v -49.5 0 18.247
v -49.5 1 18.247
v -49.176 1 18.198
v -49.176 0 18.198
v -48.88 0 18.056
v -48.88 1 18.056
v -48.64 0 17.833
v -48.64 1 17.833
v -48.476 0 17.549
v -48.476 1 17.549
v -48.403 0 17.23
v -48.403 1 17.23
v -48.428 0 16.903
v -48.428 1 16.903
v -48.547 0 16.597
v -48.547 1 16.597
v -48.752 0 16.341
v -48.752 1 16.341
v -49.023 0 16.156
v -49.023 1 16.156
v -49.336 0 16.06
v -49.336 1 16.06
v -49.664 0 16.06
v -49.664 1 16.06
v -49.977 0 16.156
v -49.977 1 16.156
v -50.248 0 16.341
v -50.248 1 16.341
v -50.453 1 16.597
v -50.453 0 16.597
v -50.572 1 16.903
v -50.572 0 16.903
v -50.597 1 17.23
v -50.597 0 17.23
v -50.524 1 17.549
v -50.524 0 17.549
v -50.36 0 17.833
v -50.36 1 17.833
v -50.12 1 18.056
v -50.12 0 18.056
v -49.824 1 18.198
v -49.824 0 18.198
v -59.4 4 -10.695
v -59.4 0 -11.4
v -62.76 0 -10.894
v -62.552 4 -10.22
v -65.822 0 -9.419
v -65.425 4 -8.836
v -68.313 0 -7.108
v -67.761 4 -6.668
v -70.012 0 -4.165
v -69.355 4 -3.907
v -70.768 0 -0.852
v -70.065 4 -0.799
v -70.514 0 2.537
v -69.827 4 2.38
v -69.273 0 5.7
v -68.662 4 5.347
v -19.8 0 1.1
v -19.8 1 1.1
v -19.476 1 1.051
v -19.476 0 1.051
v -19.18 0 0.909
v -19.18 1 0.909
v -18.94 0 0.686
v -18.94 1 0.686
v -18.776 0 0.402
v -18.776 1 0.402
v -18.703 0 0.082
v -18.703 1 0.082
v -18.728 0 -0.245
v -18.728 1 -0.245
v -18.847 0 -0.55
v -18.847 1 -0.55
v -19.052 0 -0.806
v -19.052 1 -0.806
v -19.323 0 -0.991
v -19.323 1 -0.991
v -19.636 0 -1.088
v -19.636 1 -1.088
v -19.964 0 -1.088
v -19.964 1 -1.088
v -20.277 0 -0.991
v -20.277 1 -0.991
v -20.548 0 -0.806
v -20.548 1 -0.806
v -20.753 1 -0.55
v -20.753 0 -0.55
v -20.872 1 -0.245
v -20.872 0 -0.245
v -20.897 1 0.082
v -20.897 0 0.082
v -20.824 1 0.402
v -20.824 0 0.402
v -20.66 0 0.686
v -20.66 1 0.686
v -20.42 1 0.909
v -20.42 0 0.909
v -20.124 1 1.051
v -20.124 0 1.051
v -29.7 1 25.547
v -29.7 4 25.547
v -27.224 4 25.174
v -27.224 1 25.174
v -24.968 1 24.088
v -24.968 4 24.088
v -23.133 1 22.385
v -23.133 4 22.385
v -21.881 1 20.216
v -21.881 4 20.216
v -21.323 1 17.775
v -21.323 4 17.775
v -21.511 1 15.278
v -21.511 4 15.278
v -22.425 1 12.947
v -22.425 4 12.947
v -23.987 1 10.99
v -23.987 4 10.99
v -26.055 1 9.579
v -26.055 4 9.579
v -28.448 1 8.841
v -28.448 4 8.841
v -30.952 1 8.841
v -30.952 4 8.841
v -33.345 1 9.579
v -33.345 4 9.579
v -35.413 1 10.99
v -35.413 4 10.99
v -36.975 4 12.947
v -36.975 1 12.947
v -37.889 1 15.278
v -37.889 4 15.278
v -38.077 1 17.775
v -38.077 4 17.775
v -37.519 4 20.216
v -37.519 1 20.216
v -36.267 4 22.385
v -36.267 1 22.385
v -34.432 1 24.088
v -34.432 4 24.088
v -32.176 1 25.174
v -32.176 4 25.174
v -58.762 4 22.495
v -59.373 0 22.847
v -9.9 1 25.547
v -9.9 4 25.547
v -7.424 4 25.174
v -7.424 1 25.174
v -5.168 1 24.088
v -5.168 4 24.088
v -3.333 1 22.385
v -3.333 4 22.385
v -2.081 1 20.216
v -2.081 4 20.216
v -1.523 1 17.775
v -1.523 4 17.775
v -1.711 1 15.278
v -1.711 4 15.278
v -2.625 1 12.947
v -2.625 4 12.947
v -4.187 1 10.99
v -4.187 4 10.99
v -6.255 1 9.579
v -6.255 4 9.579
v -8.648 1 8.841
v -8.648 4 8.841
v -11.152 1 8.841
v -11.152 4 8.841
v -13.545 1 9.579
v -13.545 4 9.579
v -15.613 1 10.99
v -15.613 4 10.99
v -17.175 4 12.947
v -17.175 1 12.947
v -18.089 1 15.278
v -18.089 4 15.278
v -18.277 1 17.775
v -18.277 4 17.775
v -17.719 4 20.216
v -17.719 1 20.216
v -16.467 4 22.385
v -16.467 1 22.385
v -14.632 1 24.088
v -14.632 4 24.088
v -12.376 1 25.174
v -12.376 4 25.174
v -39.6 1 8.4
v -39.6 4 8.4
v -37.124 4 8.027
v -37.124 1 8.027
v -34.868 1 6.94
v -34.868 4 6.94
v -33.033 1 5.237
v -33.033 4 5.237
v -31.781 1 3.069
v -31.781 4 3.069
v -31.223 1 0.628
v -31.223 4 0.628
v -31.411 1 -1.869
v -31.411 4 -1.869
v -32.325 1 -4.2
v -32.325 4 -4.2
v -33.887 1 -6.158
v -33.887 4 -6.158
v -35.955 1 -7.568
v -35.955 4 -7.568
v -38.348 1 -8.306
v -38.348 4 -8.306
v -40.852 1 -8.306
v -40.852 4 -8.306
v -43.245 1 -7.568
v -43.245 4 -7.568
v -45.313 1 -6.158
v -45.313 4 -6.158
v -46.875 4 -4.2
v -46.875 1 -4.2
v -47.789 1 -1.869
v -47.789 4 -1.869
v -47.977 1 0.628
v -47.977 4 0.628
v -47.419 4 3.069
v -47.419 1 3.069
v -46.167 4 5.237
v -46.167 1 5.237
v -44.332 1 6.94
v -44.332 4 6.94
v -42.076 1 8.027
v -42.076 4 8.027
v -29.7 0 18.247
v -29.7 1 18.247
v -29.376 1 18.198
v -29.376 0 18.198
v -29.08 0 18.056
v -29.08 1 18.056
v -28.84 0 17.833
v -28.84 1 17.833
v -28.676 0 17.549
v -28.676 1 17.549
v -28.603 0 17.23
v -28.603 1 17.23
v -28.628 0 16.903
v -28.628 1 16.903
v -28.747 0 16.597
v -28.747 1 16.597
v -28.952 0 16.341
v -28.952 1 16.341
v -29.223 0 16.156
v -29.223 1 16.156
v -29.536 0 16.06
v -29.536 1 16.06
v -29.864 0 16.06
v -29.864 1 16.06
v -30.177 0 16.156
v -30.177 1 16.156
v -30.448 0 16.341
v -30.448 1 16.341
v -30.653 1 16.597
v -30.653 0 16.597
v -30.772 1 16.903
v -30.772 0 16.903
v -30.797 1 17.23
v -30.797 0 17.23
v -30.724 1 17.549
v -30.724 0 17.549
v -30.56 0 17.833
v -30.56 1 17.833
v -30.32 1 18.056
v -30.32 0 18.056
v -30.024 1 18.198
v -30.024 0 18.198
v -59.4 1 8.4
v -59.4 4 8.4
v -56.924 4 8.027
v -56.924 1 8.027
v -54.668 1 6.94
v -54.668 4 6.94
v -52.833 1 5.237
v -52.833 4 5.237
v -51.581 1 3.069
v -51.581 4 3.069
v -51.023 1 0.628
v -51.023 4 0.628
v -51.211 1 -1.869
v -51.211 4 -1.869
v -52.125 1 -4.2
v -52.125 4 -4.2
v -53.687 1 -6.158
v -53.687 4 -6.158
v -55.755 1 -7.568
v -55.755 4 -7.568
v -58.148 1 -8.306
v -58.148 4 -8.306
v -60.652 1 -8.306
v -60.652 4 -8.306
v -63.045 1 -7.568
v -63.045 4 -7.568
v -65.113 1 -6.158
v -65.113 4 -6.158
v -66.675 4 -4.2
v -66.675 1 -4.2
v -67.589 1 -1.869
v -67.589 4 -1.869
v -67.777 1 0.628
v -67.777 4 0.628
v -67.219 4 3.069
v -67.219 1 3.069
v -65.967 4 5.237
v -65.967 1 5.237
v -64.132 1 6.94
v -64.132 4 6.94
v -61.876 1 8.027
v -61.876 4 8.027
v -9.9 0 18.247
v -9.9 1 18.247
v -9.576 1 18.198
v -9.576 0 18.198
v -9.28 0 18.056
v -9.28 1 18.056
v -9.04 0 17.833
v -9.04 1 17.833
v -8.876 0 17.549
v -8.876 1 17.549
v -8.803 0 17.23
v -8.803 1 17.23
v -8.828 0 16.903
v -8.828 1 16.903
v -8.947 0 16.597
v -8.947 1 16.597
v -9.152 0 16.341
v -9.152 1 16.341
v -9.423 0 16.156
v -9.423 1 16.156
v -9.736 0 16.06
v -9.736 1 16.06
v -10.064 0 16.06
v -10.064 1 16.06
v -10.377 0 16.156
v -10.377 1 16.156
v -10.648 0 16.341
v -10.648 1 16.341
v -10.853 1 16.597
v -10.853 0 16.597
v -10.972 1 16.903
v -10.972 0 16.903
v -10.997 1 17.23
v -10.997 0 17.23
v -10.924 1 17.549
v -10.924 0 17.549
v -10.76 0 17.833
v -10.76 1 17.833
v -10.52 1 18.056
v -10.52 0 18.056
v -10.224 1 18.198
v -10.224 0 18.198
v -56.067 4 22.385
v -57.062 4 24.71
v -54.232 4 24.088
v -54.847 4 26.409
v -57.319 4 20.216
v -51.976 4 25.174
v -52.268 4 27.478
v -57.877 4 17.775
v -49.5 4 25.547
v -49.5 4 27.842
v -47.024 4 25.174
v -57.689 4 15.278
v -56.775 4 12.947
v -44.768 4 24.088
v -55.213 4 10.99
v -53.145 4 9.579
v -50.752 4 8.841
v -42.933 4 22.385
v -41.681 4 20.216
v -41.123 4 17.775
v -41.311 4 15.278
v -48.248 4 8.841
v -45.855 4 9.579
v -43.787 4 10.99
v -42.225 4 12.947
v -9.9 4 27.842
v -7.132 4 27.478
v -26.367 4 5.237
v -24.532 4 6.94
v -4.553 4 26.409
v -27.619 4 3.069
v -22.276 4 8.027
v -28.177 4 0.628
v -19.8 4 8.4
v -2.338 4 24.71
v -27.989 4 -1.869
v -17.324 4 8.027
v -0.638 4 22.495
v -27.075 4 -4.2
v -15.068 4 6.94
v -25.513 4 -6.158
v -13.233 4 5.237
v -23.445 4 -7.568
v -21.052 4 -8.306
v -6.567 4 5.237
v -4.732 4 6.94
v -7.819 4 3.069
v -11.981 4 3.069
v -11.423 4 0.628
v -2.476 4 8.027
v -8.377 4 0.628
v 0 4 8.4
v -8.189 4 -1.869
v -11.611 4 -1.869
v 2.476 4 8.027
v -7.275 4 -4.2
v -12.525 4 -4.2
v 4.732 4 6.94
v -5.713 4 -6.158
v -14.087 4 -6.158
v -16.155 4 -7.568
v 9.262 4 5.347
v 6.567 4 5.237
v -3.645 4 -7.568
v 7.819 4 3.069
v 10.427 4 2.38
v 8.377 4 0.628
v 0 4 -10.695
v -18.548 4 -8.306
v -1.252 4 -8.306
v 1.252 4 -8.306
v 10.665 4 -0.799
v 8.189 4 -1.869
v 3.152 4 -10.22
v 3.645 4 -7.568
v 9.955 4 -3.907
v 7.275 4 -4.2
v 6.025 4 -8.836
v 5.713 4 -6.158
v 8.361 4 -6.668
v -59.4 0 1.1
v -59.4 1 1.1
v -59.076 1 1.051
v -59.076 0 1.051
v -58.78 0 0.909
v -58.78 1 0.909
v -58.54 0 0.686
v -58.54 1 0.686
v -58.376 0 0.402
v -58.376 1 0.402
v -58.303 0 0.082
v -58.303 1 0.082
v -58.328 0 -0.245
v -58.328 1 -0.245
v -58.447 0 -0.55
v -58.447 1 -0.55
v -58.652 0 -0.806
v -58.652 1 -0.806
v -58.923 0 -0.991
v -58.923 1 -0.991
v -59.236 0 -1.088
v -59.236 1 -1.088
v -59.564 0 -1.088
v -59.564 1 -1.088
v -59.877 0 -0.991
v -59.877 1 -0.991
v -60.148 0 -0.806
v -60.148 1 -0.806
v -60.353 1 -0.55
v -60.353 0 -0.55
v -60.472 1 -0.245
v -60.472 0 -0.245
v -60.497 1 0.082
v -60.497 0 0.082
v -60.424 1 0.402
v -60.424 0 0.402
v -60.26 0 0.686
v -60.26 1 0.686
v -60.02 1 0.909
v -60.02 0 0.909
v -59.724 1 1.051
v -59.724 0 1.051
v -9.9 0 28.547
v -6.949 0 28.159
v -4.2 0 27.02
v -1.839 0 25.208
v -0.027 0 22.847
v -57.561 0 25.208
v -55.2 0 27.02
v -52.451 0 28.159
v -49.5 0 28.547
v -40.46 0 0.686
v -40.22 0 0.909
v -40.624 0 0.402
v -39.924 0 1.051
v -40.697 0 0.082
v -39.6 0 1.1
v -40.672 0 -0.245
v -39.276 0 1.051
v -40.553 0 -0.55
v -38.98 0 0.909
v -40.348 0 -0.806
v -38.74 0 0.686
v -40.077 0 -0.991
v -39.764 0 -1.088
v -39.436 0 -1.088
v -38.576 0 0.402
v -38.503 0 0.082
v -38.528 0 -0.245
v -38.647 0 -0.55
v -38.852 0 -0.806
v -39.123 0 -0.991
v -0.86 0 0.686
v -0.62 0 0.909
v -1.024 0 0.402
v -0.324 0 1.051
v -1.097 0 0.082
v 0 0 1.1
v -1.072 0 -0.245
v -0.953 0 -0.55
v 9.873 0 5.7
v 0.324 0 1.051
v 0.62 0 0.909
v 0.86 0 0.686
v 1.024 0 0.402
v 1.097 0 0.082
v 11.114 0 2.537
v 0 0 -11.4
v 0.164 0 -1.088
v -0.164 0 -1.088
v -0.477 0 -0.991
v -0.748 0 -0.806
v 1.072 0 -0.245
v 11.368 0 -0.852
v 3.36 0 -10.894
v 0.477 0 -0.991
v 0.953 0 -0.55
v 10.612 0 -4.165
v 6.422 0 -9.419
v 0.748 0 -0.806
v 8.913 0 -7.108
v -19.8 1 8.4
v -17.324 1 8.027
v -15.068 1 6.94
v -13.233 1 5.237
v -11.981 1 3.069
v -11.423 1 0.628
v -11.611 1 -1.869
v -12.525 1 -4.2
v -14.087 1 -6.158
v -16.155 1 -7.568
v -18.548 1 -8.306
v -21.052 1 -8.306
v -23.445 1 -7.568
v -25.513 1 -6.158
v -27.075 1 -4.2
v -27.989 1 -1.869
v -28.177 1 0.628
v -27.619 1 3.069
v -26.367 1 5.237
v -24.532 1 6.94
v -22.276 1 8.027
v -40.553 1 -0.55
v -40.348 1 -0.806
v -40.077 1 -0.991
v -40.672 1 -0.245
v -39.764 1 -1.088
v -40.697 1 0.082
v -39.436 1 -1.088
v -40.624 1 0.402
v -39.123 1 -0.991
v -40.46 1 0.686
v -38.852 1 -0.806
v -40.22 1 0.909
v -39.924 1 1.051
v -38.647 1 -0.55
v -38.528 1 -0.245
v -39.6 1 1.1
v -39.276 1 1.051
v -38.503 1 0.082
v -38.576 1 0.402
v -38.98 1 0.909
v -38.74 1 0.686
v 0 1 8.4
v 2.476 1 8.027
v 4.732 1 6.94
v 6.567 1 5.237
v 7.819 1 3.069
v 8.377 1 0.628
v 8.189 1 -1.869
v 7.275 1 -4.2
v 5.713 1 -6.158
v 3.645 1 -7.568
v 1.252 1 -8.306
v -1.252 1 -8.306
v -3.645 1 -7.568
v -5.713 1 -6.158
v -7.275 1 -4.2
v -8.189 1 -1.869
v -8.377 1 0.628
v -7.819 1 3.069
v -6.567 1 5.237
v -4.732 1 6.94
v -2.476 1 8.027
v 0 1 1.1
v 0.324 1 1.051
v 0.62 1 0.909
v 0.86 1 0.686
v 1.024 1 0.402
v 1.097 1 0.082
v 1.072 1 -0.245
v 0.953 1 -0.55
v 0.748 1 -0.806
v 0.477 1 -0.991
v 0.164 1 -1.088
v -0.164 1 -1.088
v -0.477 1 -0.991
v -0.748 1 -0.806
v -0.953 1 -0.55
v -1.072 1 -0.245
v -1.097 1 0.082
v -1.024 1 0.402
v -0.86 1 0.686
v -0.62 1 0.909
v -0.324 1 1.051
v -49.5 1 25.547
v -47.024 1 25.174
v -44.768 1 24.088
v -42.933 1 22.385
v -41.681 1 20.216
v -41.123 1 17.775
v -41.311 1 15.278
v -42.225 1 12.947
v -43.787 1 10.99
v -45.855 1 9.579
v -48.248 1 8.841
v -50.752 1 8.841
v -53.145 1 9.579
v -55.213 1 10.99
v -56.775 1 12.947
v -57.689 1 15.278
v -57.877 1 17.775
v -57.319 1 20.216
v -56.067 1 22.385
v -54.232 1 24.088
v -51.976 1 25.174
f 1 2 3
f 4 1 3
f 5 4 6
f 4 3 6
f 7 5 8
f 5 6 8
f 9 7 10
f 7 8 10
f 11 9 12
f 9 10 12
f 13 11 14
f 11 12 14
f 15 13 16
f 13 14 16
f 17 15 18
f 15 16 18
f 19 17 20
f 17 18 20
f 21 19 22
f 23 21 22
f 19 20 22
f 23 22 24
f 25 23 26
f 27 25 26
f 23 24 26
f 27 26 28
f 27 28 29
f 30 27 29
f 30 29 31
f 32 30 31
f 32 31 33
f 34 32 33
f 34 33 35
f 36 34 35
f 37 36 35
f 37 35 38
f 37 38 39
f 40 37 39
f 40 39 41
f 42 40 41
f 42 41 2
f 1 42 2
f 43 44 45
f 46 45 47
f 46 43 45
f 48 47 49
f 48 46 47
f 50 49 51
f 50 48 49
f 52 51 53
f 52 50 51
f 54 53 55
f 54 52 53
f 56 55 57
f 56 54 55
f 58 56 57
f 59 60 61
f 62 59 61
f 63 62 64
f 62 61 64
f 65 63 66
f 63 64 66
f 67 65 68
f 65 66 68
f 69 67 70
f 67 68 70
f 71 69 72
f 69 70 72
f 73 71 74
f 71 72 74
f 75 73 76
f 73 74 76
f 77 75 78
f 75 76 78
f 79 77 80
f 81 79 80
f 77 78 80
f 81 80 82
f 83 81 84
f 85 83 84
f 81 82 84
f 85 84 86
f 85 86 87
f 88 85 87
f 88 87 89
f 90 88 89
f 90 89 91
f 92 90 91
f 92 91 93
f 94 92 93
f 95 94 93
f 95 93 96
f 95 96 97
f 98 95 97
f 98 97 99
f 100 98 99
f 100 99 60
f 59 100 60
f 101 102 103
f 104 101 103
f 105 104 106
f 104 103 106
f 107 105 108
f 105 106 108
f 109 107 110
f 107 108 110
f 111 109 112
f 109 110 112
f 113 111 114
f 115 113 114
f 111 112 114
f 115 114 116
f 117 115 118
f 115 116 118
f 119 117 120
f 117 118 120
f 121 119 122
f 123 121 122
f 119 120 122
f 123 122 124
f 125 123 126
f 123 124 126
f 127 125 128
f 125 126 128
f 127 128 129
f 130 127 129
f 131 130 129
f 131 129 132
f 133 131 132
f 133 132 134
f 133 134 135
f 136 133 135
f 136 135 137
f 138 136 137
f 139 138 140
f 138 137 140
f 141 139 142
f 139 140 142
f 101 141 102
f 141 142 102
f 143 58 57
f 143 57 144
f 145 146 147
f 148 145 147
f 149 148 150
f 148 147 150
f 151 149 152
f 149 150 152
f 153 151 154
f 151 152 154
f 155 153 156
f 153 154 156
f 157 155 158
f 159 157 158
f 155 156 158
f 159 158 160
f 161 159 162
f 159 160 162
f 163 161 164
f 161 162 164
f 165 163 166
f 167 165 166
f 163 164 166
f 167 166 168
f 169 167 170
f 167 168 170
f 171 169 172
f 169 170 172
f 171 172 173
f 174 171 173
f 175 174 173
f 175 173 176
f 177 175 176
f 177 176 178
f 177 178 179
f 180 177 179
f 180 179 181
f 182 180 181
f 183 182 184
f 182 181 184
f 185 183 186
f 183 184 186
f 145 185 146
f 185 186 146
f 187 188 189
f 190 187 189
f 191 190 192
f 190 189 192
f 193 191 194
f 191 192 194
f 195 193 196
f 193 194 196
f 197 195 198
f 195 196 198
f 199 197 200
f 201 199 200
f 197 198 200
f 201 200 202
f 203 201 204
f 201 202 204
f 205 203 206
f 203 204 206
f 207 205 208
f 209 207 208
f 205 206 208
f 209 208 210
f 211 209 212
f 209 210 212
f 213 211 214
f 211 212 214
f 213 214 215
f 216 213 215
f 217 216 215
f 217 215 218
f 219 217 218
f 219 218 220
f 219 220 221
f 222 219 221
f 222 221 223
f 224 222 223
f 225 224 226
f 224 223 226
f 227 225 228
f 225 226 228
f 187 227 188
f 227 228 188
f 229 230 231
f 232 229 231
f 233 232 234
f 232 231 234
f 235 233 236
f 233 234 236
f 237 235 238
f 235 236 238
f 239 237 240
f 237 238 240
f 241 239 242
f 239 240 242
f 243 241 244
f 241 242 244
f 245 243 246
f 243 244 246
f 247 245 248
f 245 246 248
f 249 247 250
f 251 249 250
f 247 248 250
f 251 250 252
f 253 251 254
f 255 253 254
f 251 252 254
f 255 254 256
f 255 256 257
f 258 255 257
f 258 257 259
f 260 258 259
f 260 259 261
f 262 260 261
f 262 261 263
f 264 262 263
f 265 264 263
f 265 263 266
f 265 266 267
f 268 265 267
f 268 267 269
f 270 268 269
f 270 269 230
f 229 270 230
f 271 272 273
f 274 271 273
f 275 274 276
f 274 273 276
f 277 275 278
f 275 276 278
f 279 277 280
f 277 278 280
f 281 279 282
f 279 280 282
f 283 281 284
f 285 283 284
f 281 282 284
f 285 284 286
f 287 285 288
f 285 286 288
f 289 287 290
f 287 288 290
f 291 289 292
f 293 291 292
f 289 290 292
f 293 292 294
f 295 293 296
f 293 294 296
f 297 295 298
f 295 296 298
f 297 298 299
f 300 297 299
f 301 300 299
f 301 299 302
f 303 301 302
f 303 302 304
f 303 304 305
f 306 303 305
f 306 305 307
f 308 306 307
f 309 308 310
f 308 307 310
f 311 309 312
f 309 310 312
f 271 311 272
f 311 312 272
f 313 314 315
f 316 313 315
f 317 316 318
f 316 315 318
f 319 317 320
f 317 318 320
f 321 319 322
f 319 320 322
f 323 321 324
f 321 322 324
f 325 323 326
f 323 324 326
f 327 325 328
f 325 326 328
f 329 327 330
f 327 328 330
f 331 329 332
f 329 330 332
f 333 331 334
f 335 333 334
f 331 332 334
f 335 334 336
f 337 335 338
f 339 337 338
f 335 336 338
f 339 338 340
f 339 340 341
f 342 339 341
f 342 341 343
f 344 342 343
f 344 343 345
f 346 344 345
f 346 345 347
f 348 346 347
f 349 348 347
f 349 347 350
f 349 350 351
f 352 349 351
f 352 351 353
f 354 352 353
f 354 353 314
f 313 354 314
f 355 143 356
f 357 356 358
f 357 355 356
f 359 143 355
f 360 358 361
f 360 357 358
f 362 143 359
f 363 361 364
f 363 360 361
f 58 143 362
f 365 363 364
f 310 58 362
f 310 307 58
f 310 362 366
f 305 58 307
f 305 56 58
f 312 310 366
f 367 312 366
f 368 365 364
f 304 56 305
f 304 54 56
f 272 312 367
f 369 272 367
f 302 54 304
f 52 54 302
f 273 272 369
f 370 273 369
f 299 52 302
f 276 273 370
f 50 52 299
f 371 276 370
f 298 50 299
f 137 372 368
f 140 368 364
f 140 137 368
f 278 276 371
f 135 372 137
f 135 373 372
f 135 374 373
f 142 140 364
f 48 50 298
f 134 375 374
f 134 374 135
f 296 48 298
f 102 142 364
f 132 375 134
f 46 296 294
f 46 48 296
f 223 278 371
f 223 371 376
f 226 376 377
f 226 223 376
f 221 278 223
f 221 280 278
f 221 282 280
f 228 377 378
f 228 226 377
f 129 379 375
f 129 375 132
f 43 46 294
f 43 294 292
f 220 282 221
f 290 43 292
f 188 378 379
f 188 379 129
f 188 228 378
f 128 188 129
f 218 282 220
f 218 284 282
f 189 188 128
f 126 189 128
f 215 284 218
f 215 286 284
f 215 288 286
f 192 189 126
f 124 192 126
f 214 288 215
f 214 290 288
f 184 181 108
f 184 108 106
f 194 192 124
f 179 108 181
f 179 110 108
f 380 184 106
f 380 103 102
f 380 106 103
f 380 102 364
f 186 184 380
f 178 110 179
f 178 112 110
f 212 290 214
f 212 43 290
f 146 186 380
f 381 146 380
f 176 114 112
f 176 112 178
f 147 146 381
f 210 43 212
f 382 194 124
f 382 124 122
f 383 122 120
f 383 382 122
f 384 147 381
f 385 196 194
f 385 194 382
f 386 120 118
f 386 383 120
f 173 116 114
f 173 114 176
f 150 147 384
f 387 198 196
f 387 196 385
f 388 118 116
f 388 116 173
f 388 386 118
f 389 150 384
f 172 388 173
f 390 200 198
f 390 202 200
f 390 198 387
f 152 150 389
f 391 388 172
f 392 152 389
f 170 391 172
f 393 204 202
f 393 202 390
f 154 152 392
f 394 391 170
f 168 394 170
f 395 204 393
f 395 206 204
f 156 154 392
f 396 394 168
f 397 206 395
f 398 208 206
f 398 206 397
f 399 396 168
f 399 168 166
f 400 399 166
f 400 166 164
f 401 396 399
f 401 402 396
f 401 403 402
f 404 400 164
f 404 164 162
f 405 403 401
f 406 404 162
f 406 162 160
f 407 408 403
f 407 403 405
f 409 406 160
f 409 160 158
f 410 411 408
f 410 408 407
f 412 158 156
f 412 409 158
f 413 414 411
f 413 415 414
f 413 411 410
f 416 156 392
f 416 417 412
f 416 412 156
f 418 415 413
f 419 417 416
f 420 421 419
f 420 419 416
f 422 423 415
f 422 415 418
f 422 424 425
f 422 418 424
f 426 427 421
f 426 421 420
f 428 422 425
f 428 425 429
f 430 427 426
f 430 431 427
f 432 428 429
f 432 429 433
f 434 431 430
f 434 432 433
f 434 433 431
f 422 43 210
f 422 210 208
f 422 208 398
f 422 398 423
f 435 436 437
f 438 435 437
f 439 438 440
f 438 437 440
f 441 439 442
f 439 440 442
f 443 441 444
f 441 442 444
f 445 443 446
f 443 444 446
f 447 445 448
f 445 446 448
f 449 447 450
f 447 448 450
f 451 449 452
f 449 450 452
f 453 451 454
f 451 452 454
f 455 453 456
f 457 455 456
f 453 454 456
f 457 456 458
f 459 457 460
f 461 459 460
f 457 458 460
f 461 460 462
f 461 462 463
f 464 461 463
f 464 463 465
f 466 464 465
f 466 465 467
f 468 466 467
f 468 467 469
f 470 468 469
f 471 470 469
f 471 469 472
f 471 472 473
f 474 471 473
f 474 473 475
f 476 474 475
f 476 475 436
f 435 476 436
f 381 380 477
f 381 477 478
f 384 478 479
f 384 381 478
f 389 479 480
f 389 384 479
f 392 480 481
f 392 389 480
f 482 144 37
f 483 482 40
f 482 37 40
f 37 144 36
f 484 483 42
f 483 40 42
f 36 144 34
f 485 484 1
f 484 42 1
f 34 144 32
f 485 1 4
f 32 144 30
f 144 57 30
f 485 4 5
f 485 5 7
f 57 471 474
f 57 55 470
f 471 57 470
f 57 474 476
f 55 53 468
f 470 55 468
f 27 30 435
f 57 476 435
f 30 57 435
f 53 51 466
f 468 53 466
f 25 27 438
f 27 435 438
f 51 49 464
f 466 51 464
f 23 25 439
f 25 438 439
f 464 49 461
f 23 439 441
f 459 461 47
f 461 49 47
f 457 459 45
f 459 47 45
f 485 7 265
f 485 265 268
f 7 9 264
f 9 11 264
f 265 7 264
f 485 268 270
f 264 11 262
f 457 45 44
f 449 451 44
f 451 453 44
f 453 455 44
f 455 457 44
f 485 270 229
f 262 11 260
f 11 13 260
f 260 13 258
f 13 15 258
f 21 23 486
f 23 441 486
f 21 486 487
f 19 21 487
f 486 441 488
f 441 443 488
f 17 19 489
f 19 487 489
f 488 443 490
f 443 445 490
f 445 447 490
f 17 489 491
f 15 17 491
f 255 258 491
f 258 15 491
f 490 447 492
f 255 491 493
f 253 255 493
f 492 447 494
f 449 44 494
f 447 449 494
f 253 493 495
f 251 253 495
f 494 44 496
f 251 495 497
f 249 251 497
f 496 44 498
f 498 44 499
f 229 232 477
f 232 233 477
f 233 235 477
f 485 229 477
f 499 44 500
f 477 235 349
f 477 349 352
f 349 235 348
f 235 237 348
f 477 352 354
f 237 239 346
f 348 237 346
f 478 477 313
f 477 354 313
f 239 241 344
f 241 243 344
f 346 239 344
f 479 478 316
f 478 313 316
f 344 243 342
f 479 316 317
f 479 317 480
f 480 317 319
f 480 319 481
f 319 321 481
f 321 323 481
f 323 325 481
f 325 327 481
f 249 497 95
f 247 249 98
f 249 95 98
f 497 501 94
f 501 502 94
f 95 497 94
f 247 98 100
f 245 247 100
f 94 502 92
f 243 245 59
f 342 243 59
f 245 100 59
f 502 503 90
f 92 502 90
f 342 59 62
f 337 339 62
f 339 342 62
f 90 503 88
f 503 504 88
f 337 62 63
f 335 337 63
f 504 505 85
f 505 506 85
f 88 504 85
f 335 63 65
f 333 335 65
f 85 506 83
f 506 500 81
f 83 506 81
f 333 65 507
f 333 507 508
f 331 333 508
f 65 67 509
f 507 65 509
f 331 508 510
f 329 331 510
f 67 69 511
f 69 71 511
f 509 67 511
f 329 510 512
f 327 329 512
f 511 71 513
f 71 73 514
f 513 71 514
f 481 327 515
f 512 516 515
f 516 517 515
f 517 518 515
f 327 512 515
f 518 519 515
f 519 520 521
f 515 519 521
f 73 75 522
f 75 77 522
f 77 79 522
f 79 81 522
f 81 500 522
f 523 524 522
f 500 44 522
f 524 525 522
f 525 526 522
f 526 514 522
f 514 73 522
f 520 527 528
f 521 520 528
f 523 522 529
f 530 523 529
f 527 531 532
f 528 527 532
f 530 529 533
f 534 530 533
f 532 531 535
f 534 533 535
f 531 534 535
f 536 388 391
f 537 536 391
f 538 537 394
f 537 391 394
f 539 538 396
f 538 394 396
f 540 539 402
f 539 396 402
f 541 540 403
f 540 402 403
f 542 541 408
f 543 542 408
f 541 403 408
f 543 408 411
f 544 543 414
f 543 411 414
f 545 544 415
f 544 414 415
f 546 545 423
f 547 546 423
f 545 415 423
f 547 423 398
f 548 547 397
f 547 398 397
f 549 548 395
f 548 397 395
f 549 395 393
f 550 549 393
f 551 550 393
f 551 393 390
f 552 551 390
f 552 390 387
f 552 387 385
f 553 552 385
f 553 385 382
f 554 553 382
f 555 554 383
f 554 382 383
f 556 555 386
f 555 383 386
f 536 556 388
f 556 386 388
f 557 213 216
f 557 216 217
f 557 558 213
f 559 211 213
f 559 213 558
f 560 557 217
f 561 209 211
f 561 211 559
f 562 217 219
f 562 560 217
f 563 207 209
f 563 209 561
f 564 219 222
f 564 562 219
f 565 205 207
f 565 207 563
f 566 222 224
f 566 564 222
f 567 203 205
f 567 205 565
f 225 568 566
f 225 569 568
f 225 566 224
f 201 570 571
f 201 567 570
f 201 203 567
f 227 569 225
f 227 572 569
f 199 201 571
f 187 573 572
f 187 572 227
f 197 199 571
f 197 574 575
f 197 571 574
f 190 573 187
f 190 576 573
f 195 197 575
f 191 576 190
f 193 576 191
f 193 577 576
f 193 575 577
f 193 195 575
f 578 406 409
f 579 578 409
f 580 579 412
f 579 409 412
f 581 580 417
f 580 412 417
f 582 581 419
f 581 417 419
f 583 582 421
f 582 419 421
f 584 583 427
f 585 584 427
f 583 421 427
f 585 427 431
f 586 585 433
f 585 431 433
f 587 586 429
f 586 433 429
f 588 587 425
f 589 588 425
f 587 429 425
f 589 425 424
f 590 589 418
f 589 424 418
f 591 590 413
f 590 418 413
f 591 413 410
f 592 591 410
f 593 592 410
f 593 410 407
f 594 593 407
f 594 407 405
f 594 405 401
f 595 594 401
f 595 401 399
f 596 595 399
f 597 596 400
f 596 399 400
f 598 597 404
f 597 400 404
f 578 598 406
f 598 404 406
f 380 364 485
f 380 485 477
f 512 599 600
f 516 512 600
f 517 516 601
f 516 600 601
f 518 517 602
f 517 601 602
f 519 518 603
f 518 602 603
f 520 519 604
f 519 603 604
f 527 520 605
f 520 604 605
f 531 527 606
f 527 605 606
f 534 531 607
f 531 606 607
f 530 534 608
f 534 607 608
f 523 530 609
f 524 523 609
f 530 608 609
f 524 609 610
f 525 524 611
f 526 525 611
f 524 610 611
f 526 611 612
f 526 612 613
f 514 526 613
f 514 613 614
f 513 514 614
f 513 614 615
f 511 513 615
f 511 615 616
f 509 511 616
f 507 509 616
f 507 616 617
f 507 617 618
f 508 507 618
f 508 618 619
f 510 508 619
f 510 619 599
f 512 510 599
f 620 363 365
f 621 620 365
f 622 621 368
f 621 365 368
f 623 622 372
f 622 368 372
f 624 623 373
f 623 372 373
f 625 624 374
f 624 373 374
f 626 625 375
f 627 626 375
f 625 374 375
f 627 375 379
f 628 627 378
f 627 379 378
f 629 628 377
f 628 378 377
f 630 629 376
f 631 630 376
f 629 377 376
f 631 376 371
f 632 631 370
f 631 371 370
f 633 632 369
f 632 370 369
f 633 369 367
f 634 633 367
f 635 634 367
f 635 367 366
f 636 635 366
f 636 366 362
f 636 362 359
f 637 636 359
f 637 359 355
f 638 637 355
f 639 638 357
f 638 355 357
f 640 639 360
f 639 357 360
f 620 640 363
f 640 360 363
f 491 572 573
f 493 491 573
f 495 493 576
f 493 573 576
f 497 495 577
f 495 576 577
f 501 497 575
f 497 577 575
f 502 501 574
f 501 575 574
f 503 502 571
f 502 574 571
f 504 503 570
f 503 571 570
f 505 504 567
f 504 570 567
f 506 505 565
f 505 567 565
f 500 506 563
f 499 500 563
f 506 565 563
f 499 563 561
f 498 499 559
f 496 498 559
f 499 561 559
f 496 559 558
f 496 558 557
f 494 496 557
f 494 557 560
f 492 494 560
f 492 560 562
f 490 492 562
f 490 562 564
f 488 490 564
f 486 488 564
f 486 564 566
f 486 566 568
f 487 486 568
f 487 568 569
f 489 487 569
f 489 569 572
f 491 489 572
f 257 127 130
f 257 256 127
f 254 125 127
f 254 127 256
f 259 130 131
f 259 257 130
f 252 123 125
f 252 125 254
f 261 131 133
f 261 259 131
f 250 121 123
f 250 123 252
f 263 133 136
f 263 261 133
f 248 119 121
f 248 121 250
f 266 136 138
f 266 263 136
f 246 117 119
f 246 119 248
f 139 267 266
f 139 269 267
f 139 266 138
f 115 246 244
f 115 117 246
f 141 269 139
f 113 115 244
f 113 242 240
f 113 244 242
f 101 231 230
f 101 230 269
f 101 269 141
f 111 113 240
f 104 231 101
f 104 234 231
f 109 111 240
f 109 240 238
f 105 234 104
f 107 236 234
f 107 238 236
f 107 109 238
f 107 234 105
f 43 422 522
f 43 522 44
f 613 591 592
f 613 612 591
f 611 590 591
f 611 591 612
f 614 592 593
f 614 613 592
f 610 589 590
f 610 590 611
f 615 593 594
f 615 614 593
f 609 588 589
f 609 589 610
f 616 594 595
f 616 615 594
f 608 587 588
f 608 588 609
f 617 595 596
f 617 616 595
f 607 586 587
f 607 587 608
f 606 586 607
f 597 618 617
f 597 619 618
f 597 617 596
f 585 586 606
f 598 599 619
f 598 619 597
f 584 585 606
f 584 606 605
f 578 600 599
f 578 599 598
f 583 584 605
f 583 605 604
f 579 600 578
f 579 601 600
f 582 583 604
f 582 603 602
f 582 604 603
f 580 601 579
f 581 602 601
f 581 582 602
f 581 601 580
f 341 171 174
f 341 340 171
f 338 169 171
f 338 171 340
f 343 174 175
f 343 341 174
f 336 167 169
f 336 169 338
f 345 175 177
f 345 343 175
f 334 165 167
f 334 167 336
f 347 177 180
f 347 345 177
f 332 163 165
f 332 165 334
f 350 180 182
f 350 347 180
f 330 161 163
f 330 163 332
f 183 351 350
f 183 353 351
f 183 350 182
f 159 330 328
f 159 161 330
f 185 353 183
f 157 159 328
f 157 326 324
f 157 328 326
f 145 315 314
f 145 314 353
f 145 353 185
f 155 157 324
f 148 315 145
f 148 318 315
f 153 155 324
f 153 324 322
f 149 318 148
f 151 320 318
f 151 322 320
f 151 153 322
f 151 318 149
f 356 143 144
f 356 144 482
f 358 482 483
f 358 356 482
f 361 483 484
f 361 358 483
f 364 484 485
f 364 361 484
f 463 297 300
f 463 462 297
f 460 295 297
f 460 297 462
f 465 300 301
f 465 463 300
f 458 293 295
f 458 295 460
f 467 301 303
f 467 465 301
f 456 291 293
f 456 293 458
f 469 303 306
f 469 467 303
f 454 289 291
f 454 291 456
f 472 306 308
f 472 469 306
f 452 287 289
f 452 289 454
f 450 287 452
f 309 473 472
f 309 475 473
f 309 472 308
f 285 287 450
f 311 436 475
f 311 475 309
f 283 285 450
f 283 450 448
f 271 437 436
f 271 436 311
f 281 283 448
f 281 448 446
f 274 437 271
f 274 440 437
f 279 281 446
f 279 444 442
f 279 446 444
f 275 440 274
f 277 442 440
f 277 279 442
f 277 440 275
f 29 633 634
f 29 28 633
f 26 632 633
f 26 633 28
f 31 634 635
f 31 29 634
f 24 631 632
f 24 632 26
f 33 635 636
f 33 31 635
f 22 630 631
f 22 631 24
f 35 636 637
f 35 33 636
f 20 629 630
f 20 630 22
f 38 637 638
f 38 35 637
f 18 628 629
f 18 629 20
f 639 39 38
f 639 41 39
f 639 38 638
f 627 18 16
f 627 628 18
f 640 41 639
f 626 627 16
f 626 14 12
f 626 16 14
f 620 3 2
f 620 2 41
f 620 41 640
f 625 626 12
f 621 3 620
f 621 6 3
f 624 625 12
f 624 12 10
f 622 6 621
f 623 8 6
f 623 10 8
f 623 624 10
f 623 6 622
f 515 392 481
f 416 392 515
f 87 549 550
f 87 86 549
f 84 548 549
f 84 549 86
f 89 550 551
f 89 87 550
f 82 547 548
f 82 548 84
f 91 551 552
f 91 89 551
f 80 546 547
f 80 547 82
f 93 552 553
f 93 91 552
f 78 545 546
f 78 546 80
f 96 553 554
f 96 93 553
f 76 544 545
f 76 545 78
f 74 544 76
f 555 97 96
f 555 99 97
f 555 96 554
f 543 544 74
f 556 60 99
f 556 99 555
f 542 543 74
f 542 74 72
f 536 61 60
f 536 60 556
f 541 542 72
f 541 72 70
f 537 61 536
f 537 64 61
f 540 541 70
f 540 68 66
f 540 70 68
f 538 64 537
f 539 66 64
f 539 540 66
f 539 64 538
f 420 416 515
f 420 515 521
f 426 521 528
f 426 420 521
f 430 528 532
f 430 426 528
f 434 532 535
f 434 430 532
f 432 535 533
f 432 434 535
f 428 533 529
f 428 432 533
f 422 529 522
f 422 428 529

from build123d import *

# Parameters (mm, degrees)
BOSS_EXTRUDE1_DEPTH = 4
BOSS_EXTRUDE1_DRAFT = 10
CUT_EXTRUDE1_START  = 4
SKETCH1_3_R         = 1.1
CUT_EXTRUDE1_DEPTH  = 4
CUT_EXTRUDE2_START  = 4
SKETCH1_4_R         = 8.4
SKETCH1_4_R_2       = 1.1
CUT_EXTRUDE2_DEPTH  = 3


# Read off the part's stored shape, not the designer's step: Boss-Extrude1
with BuildPart() as part:
    # Boss-Extrude1 outline → Boss-Extrude1 (with draft: the straight prism first)
    with BuildSketch(Plane(origin=(0, 4, 0), x_dir=(1, 0, 0), z_dir=(0, 1, 0))):
        with BuildLine():
            ThreePointArc((-58.761875024, -22.494649034), (-54.847346039, -26.409178019), (-49.5, -27.841995072))
            Line((-49.5, -27.841995072), (-9.9, -27.841995072))
            ThreePointArc((-9.9, -27.841995072), (-4.552653961, -26.409178019), (-0.638124976, -22.494649034))
            Line((-0.638124976, -22.494649034), (9.261875024, -5.347346039))
            ThreePointArc((9.261875024, -5.347346039), (9.261875024, 5.347346039), (0, 10.694692077))
            Line((0, 10.694692077), (-59.4, 10.694692077))
            ThreePointArc((-59.4, 10.694692077), (-68.661875024, 5.347346039), (-68.661875024, -5.347346039))
            Line((-68.661875024, -5.347346039), (-58.761875024, -22.494649034))
        make_face()
    extrude(amount=-BOSS_EXTRUDE1_DEPTH)
    # Boss-Extrude1: the draft: its side faces are tilted about the plane it starts from
    boss_extrude1_sides = [part.faces().sort_by_distance(p)[0] for p in [
        (-68.661875024, 2, -5.347346038),
        (-63.711875024, 2, 13.920997536),
        (-54.847346038, 2, 26.409178019),
        (-29.7, 2, 27.841995072),
        (-4.552653962, 2, 26.409178019),
        (4.311875024, 2, 13.920997536),
        (9.261875024, 2, -5.347346038),
        (-29.7, 2, -10.694692077),
    ]]
    draft(boss_extrude1_sides, Plane(origin=(0, 4, 0), x_dir=(1, 0, 0), z_dir=(0, 1, 0)), BOSS_EXTRUDE1_DRAFT)

    # Sketch1<3> → Cut-Extrude1 (cut)
    with BuildSketch(Plane(origin=(0, 0, 0), x_dir=(1, 0, 0), z_dir=(0, 1, 0)).offset(CUT_EXTRUDE1_START)):
        with Locations(Location((-9.9, -17.147302995, 0), (0, 0, 270))):
            Circle(SKETCH1_3_R)
        with Locations(Location((0, 0, 0), (0, 0, 270))):
            Circle(SKETCH1_3_R)
        with Locations(Location((-29.7, -17.147302995, 0), (0, 0, 270))):
            Circle(SKETCH1_3_R)
        with Locations(Location((-39.6, 0, 0), (0, 0, 270))):
            Circle(SKETCH1_3_R)
        with Locations(Location((-49.5, -17.147302995, 0), (0, 0, 270))):
            Circle(SKETCH1_3_R)
        with Locations(Location((-59.4, 0, 0), (0, 0, 270))):
            Circle(SKETCH1_3_R)
        with Locations(Location((-19.8, 0, 0), (0, 0, 270))):
            Circle(SKETCH1_3_R)
    extrude(amount=-CUT_EXTRUDE1_DEPTH, mode=Mode.SUBTRACT)

    # Sketch1<4> → Cut-Extrude2 (cut)
    # profile 1 of 7: a face of its own
    with BuildSketch(Plane(origin=(0, 0, 0), x_dir=(1, 0, 0), z_dir=(0, 1, 0)).offset(CUT_EXTRUDE2_START)):
        with Locations(Location((-19.8, 0, 0), (0, 0, 270))):
            Circle(SKETCH1_4_R)
        with Locations(Location((-19.8, 0, 0), (0, 0, 270))):
            Circle(SKETCH1_4_R_2, mode=Mode.SUBTRACT)
    # profile 2 of 7: a face of its own
    with BuildSketch(Plane(origin=(0, 0, 0), x_dir=(1, 0, 0), z_dir=(0, 1, 0)).offset(CUT_EXTRUDE2_START)):
        with Locations(Location((-9.9, -17.147302995, 0), (0, 0, 270))):
            Circle(SKETCH1_4_R)
        with Locations(Location((-9.9, -17.147302995, 0), (0, 0, 270))):
            Circle(SKETCH1_4_R_2, mode=Mode.SUBTRACT)
    # profile 3 of 7: a face of its own
    with BuildSketch(Plane(origin=(0, 0, 0), x_dir=(1, 0, 0), z_dir=(0, 1, 0)).offset(CUT_EXTRUDE2_START)):
        with Locations(Location((0, 0, 0), (0, 0, 270))):
            Circle(SKETCH1_4_R)
        with Locations(Location((0, 0, 0), (0, 0, 270))):
            Circle(SKETCH1_4_R_2, mode=Mode.SUBTRACT)
    # profile 4 of 7: a face of its own
    with BuildSketch(Plane(origin=(0, 0, 0), x_dir=(1, 0, 0), z_dir=(0, 1, 0)).offset(CUT_EXTRUDE2_START)):
        with Locations(Location((-29.7, -17.147302995, 0), (0, 0, 270))):
            Circle(SKETCH1_4_R)
        with Locations(Location((-29.7, -17.147302995, 0), (0, 0, 270))):
            Circle(SKETCH1_4_R_2, mode=Mode.SUBTRACT)
    # profile 5 of 7: a face of its own
    with BuildSketch(Plane(origin=(0, 0, 0), x_dir=(1, 0, 0), z_dir=(0, 1, 0)).offset(CUT_EXTRUDE2_START)):
        with Locations(Location((-39.6, 0, 0), (0, 0, 270))):
            Circle(SKETCH1_4_R)
        with Locations(Location((-39.6, 0, 0), (0, 0, 270))):
            Circle(SKETCH1_4_R_2, mode=Mode.SUBTRACT)
    # profile 6 of 7: a face of its own
    with BuildSketch(Plane(origin=(0, 0, 0), x_dir=(1, 0, 0), z_dir=(0, 1, 0)).offset(CUT_EXTRUDE2_START)):
        with Locations(Location((-49.5, -17.147302995, 0), (0, 0, 270))):
            Circle(SKETCH1_4_R)
        with Locations(Location((-49.5, -17.147302995, 0), (0, 0, 270))):
            Circle(SKETCH1_4_R_2, mode=Mode.SUBTRACT)
    # profile 7 of 7: a face of its own
    with BuildSketch(Plane(origin=(0, 0, 0), x_dir=(1, 0, 0), z_dir=(0, 1, 0)).offset(CUT_EXTRUDE2_START)):
        with Locations(Location((-59.4, 0, 0), (0, 0, 270))):
            Circle(SKETCH1_4_R)
        with Locations(Location((-59.4, 0, 0), (0, 0, 270))):
            Circle(SKETCH1_4_R_2, mode=Mode.SUBTRACT)
    extrude(amount=-CUT_EXTRUDE2_DEPTH, mode=Mode.SUBTRACT)


solid = part.part
